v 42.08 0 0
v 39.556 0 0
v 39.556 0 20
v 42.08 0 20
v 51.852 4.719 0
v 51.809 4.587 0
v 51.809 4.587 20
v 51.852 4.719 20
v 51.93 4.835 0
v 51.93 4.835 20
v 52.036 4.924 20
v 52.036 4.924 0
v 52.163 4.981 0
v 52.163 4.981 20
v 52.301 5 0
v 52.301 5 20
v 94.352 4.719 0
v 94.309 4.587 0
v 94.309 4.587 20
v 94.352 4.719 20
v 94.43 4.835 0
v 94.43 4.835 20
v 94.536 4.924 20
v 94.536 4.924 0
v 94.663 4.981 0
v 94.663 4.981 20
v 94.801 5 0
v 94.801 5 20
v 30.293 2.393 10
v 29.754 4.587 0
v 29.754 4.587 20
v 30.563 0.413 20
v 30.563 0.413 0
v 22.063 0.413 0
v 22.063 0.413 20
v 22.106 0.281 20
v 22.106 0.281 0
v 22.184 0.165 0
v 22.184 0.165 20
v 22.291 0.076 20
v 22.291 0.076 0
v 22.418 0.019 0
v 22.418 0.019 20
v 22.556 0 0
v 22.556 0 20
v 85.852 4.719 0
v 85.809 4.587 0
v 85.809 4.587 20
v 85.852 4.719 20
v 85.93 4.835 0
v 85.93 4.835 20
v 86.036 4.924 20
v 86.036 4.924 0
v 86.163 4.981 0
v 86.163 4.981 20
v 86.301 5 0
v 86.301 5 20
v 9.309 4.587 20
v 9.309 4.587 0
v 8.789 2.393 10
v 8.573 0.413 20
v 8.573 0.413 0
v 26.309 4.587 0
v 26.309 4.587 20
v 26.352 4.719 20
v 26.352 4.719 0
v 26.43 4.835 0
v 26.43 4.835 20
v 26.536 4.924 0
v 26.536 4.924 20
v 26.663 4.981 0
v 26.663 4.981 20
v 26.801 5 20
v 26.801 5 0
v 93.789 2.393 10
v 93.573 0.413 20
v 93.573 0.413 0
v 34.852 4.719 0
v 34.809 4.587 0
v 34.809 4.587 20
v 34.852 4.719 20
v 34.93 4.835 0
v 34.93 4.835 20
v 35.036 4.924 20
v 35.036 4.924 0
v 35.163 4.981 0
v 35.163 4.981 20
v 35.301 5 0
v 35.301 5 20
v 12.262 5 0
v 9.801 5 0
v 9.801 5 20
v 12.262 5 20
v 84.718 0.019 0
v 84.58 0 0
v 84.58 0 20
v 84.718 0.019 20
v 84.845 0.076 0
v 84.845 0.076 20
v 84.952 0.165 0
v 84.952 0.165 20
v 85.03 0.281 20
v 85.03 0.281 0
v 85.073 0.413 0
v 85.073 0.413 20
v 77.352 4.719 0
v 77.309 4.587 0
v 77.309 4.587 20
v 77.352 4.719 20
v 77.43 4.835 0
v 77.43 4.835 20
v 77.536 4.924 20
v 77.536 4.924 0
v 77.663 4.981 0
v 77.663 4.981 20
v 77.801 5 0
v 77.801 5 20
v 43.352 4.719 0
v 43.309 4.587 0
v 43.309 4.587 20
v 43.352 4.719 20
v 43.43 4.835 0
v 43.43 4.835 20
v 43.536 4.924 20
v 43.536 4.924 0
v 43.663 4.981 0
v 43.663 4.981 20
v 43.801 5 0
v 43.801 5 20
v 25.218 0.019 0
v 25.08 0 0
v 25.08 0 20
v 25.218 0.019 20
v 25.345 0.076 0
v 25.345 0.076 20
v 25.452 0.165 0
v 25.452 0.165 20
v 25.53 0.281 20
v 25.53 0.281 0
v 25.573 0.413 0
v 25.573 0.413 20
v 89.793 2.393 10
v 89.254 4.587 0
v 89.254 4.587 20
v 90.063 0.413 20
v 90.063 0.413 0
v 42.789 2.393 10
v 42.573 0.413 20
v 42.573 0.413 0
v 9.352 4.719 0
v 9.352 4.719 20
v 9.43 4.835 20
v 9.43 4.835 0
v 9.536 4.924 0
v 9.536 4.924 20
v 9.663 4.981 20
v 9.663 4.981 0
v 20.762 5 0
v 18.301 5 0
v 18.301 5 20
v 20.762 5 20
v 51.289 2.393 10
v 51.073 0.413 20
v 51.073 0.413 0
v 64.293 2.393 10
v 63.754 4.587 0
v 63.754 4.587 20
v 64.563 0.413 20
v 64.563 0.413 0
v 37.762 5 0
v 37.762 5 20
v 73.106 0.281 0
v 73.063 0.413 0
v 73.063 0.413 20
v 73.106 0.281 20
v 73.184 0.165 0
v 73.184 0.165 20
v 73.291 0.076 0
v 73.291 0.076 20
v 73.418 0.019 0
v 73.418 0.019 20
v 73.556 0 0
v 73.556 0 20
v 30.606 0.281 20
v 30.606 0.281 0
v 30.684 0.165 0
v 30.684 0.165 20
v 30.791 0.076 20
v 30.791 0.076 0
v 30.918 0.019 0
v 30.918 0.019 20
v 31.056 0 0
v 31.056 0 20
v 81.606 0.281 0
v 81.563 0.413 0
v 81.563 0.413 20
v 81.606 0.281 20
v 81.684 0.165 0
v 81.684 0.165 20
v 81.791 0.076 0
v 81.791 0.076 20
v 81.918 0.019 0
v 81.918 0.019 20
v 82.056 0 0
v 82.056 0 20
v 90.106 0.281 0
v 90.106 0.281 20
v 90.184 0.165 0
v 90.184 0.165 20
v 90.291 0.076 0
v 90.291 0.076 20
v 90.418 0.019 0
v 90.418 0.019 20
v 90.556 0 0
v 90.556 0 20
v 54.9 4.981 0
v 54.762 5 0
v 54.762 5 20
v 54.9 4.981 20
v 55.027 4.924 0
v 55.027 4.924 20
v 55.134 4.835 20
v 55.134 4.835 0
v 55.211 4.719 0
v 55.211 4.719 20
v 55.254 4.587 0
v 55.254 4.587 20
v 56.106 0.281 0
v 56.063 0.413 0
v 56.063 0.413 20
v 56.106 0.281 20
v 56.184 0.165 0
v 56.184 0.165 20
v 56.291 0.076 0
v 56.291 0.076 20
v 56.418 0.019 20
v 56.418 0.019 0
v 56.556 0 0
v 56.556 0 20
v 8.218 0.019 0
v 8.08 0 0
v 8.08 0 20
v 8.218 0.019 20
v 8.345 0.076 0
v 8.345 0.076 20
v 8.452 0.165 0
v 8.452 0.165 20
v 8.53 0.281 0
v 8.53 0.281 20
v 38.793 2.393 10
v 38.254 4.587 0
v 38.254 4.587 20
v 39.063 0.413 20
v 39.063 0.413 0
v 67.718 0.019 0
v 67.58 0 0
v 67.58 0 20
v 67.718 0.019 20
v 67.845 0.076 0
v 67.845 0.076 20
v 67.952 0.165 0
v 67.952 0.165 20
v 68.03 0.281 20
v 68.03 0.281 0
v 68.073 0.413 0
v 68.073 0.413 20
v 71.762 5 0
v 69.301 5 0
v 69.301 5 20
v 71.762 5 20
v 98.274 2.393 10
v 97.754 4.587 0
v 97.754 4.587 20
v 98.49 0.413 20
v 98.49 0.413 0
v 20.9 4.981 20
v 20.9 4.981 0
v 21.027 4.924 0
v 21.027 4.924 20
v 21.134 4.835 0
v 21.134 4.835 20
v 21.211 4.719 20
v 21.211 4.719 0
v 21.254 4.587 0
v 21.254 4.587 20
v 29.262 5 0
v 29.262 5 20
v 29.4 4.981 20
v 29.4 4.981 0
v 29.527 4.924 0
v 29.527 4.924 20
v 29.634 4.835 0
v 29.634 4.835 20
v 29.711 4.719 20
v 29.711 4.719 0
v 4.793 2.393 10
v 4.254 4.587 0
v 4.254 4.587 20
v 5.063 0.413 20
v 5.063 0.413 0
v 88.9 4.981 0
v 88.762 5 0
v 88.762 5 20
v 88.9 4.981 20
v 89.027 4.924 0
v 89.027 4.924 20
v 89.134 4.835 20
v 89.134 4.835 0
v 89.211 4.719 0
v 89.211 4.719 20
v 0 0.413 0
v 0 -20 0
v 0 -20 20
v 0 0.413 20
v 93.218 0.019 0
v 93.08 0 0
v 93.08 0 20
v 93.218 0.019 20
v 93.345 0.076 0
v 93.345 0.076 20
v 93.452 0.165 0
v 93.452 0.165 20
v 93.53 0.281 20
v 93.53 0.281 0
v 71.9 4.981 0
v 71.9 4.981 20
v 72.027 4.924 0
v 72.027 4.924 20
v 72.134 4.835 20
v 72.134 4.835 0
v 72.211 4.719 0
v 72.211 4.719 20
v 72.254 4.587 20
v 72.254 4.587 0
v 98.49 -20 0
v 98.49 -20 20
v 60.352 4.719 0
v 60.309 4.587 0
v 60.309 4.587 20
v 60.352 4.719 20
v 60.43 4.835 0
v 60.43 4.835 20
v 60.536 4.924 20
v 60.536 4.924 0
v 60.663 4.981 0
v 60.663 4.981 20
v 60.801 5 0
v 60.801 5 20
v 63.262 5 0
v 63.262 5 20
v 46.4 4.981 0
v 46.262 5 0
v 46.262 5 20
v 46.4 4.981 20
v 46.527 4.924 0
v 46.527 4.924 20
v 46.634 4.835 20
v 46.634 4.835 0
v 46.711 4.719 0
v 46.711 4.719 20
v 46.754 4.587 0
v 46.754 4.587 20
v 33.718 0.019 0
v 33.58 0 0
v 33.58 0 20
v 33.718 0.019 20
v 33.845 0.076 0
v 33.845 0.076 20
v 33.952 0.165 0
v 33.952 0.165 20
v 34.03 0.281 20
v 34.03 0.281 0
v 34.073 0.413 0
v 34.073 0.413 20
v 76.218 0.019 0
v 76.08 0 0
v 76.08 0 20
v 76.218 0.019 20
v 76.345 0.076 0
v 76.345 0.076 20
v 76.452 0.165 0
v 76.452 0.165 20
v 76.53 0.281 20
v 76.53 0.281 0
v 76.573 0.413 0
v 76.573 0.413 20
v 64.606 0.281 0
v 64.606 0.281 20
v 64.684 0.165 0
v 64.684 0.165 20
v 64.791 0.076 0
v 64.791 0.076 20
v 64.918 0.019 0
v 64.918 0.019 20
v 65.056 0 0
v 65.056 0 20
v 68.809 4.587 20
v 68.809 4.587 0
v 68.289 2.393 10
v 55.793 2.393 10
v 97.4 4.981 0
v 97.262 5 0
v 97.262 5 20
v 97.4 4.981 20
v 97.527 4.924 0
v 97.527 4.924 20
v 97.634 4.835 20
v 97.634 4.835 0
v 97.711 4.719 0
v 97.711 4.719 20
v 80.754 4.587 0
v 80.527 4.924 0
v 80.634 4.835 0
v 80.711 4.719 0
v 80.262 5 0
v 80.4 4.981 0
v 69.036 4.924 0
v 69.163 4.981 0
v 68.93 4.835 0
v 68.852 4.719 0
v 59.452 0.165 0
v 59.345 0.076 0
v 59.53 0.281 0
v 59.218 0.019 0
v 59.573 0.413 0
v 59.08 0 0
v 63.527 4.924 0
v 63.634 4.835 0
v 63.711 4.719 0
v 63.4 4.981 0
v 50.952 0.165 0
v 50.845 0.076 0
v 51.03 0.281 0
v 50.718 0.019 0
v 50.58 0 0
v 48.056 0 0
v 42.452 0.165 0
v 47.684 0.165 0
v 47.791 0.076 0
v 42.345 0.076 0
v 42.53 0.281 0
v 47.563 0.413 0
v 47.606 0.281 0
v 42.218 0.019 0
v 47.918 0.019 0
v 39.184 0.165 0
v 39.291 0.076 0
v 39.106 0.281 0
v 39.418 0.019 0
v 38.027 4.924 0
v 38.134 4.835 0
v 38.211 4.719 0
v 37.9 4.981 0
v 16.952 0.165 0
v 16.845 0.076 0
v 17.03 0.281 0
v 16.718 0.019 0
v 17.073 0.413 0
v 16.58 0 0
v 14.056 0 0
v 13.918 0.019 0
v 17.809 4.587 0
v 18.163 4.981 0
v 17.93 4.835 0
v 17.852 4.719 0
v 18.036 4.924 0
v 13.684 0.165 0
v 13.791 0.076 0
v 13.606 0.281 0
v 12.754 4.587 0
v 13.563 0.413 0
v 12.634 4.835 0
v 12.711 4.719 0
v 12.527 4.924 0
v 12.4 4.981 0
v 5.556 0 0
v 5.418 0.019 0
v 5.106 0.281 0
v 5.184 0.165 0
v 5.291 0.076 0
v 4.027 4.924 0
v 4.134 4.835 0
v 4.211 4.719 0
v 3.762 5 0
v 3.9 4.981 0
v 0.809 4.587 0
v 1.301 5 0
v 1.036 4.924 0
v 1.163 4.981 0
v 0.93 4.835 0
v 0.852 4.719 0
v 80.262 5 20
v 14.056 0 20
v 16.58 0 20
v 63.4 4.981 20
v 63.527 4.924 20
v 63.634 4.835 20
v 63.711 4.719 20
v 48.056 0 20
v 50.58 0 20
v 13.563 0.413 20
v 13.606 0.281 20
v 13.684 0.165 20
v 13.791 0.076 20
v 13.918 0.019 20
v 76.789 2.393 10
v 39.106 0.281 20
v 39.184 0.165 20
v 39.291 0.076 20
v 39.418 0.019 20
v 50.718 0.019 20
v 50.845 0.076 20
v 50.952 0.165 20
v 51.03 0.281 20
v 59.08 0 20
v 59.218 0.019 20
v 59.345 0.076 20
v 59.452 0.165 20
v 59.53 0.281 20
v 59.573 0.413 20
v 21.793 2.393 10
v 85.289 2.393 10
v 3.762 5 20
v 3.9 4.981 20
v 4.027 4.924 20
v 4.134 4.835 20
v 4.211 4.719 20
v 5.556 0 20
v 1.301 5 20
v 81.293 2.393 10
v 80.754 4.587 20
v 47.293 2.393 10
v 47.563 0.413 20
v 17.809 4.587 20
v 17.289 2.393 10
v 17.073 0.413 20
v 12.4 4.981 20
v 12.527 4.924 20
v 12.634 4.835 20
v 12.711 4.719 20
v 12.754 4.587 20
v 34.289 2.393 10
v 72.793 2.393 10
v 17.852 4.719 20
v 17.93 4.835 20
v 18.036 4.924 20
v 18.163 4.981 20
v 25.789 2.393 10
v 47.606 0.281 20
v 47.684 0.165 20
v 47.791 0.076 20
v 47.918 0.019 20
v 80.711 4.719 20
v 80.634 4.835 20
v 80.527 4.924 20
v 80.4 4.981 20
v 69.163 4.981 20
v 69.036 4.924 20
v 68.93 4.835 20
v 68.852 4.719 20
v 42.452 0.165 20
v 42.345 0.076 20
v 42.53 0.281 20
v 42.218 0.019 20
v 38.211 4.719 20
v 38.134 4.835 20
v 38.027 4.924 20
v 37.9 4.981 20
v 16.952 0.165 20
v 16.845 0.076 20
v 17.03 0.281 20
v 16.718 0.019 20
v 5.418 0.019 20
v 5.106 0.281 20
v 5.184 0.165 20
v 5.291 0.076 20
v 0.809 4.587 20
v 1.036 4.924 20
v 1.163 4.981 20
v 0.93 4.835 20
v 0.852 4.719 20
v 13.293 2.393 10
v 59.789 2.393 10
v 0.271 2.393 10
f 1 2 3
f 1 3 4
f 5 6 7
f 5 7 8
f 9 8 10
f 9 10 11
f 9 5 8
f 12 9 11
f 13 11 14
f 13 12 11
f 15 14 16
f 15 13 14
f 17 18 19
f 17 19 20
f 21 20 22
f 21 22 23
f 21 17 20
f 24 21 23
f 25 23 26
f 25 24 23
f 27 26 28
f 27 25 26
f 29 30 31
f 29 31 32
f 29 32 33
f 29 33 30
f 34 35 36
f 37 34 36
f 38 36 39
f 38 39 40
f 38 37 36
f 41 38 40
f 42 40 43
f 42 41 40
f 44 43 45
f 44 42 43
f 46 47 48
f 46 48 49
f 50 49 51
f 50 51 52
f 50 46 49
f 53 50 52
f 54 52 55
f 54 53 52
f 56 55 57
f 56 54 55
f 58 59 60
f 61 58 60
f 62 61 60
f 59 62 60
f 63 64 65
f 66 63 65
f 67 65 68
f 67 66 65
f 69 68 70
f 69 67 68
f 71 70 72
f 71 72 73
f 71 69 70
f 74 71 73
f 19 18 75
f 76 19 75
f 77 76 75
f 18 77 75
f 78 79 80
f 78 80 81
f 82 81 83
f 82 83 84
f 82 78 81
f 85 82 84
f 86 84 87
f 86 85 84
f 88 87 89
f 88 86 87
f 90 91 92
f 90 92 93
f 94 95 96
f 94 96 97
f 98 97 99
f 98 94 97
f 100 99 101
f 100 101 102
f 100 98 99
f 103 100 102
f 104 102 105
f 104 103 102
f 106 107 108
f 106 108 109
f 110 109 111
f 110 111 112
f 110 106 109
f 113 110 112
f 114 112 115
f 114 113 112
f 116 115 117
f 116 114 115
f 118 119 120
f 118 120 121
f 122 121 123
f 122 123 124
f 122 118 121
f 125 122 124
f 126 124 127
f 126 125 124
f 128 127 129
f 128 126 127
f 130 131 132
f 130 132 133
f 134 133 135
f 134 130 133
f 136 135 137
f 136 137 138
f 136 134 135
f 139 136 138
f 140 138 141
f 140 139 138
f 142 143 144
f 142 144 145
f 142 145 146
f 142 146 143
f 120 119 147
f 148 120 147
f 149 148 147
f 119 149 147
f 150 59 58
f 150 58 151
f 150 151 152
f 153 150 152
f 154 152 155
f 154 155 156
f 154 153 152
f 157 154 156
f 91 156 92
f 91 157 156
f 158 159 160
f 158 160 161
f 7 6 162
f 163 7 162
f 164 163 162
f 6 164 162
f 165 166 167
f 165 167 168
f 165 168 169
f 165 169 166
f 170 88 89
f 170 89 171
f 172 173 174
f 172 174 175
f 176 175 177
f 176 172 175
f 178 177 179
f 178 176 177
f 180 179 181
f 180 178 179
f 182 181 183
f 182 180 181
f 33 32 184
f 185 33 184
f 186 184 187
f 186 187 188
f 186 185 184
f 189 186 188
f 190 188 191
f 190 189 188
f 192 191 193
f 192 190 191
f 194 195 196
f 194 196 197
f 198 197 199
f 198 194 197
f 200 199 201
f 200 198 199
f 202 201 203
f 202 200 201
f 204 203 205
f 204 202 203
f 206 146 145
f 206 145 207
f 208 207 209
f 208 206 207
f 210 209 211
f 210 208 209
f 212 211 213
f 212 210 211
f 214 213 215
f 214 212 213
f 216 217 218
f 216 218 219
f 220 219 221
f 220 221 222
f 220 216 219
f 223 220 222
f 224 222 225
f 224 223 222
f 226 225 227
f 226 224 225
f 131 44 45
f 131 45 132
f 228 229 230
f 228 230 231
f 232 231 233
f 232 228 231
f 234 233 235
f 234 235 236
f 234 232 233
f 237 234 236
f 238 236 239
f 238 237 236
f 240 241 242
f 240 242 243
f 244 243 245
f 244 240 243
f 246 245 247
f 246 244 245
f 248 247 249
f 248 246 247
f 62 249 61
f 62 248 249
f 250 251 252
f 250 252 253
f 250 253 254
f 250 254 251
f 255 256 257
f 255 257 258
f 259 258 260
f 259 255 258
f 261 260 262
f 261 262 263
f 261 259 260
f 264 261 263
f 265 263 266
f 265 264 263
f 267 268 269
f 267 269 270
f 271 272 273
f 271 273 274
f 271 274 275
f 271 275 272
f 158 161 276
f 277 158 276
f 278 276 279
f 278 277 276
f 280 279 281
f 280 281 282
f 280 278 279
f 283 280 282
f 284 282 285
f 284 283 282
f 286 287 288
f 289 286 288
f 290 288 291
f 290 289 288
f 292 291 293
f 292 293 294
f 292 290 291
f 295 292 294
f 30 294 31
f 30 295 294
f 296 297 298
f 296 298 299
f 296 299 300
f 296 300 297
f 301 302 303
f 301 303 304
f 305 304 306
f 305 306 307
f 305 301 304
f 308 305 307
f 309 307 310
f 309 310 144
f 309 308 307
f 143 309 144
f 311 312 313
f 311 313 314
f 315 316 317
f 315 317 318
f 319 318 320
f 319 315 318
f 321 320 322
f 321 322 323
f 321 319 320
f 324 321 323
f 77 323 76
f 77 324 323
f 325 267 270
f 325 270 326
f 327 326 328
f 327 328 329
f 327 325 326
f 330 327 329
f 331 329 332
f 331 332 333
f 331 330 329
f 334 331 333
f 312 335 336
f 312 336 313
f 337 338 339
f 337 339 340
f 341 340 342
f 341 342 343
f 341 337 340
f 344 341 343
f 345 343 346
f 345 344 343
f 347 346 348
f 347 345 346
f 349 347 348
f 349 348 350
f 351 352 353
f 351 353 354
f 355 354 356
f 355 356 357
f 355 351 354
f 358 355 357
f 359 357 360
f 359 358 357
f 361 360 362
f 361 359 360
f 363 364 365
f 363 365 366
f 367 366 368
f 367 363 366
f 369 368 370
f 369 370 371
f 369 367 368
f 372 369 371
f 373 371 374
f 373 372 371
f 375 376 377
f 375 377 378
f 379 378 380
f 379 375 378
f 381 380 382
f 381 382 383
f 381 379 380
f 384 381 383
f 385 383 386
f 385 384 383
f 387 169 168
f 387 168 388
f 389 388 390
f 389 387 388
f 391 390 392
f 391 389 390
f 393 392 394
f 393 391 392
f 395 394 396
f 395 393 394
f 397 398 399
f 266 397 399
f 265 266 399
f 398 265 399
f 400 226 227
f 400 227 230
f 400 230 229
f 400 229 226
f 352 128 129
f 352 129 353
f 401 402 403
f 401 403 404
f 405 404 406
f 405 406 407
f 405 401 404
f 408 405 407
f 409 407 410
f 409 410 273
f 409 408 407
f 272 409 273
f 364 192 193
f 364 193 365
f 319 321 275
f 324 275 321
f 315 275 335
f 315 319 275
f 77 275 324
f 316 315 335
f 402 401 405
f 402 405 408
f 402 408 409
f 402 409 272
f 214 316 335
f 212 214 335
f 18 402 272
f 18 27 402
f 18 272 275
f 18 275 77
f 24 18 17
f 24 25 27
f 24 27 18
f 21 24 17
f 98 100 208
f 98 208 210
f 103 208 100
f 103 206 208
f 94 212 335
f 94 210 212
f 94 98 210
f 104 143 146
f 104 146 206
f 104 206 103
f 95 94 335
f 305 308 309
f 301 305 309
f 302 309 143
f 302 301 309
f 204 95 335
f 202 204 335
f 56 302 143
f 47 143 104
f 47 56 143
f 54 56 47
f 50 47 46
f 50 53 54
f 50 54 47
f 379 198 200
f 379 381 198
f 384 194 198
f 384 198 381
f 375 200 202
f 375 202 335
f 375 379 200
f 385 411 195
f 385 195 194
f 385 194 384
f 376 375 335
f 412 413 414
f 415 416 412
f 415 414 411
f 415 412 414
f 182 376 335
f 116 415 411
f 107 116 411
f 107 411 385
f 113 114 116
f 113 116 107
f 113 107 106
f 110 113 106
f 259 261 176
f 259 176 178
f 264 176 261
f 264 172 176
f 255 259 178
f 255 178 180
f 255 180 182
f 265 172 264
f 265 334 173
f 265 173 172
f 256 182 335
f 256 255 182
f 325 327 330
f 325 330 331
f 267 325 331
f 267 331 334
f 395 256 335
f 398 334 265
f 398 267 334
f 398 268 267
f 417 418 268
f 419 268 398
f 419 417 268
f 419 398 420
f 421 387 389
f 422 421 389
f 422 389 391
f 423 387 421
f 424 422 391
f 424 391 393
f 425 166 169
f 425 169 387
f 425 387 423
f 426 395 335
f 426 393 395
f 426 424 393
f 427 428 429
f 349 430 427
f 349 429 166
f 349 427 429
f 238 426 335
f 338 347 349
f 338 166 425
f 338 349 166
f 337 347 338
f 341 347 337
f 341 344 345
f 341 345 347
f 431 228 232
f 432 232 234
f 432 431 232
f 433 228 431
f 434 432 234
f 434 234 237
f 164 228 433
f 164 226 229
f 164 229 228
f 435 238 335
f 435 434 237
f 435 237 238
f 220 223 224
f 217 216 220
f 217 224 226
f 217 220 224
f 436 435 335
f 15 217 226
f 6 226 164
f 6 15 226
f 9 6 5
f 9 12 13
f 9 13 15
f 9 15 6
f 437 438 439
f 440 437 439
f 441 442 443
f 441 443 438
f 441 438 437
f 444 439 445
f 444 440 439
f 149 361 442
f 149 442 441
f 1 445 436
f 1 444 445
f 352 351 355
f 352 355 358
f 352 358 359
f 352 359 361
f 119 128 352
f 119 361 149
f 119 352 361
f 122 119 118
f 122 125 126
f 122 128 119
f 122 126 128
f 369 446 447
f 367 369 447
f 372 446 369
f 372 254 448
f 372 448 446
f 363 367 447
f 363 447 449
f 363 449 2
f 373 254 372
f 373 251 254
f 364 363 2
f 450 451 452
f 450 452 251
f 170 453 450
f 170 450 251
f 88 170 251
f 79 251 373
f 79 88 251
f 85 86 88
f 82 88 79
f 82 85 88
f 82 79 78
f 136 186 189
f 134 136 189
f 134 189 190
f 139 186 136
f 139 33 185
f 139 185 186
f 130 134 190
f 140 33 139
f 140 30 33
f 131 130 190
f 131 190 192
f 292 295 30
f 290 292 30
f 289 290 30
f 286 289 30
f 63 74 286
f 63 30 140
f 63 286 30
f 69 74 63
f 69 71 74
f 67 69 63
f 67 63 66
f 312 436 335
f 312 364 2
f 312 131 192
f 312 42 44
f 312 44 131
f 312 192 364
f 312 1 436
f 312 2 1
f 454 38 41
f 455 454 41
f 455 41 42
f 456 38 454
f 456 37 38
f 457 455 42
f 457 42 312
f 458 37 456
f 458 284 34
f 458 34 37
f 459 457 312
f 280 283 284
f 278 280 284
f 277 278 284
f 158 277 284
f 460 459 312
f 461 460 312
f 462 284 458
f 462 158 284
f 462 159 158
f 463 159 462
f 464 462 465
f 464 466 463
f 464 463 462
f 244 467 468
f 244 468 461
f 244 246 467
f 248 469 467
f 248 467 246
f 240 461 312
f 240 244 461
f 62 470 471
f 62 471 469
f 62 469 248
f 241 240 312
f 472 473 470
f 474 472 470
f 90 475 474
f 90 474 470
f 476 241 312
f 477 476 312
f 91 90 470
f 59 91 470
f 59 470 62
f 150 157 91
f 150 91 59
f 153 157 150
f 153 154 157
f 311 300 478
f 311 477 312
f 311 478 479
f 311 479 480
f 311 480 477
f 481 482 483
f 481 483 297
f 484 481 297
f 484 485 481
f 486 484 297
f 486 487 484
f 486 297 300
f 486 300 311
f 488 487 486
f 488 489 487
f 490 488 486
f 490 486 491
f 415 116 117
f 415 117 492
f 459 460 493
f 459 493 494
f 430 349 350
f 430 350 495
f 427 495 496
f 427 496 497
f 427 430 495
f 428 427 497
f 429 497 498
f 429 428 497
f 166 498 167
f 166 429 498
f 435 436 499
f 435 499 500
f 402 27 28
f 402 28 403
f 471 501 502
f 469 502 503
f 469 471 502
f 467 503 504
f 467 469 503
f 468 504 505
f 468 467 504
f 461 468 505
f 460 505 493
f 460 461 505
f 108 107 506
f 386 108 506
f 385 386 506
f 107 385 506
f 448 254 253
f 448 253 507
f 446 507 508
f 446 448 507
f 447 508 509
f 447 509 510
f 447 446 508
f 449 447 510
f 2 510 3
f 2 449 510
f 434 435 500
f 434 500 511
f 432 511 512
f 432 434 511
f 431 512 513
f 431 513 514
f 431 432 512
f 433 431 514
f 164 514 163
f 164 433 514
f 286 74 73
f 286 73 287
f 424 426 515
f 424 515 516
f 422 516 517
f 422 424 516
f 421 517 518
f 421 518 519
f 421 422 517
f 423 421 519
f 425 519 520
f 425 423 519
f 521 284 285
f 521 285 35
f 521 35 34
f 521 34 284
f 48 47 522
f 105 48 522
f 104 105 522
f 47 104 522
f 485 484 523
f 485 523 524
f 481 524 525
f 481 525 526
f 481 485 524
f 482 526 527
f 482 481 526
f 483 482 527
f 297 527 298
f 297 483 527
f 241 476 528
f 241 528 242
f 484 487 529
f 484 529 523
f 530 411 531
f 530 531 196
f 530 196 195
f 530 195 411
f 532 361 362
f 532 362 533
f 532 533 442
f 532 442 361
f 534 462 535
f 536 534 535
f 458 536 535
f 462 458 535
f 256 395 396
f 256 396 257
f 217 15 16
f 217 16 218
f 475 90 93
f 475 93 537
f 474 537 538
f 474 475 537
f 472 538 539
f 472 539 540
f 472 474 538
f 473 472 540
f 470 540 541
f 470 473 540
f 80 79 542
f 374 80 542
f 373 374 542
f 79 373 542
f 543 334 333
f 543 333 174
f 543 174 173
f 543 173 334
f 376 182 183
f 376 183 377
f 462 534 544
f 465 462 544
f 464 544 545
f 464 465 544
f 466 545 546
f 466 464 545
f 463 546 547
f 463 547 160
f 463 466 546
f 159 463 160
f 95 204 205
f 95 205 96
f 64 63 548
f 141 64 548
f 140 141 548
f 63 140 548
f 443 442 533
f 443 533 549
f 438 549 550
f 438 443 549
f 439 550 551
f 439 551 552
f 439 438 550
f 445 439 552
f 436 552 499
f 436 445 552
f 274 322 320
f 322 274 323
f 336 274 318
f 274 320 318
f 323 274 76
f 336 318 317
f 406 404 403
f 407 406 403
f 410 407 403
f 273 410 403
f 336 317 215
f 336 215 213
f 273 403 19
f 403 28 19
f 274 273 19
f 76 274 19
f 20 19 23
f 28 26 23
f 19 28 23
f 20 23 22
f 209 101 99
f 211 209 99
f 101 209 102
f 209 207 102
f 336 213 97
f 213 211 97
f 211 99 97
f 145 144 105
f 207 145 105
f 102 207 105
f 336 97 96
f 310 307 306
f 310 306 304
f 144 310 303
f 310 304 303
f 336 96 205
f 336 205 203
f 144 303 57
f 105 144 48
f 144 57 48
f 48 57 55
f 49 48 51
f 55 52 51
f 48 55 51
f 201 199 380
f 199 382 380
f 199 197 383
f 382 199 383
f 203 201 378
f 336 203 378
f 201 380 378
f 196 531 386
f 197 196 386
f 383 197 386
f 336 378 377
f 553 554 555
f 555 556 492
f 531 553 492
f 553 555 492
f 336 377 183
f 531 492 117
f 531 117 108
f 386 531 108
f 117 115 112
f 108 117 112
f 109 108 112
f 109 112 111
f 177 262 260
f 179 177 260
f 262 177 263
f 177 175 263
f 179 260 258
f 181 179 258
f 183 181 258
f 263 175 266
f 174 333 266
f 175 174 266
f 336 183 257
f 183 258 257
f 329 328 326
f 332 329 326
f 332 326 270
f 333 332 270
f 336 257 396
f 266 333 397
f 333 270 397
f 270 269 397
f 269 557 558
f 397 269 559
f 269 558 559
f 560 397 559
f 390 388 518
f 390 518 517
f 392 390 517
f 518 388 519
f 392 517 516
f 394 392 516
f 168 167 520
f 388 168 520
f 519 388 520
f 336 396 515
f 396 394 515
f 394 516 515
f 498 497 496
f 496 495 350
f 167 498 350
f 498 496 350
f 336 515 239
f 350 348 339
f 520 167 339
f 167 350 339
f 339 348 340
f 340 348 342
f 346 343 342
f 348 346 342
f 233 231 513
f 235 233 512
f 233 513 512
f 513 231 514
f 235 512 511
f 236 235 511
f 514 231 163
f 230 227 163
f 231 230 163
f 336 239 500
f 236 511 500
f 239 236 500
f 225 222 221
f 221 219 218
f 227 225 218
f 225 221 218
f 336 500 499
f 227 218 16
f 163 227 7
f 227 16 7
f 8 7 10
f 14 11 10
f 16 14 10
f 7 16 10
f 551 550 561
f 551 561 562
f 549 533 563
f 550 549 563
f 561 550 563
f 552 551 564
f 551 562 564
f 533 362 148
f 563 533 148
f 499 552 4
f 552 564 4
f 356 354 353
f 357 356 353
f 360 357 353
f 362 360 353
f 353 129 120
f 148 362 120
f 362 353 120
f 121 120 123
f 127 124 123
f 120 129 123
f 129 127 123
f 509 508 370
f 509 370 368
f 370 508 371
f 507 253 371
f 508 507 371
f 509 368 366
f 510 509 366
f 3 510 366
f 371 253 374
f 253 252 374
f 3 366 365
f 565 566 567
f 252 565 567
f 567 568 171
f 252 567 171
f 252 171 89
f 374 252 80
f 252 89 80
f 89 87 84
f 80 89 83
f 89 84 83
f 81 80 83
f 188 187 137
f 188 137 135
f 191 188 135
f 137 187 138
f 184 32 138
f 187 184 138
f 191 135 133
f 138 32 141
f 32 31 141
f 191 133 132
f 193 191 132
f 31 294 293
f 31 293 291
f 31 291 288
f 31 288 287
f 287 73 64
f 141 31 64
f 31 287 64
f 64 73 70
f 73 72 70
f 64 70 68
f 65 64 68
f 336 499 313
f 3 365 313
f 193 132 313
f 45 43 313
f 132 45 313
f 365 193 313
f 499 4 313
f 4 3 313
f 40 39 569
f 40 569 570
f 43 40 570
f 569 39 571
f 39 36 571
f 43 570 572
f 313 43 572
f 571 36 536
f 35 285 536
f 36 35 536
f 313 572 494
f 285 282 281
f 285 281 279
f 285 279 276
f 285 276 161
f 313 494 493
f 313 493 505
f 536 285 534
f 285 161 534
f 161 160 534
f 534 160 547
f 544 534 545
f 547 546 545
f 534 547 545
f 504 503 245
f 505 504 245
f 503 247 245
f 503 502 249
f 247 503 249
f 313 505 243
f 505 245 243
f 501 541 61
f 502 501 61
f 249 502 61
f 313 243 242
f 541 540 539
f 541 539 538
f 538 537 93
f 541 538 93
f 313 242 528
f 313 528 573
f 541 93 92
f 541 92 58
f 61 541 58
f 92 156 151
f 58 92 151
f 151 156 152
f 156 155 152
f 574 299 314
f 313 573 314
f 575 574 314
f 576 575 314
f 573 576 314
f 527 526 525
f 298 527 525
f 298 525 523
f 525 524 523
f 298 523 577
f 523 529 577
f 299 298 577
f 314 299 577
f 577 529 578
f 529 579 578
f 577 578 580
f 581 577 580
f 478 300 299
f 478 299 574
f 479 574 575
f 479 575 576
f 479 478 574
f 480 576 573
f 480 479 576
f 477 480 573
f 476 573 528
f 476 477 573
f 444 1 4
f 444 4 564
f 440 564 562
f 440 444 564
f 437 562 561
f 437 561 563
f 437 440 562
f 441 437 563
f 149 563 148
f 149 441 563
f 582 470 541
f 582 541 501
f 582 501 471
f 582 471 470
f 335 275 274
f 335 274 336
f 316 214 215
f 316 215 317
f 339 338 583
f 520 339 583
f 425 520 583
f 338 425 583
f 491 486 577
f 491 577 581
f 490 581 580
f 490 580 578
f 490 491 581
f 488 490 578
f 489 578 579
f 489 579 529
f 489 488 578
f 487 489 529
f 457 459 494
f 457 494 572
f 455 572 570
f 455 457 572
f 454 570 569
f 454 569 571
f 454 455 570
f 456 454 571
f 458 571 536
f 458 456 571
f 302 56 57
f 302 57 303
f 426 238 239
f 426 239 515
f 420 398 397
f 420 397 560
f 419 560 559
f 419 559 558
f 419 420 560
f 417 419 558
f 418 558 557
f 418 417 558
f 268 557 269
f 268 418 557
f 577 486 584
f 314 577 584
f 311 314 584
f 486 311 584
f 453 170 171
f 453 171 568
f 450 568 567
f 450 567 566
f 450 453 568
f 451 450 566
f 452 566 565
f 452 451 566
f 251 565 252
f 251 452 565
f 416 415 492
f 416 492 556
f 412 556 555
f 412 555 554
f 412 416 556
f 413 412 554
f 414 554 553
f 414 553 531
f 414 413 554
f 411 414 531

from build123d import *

# Parameters (mm, degrees)
BOSS_EXTRUDE1_DEPTH = 20


with BuildPart() as part:
    # Sketch2 → Boss-Extrude1 (new body)
    with BuildSketch(Plane.XY):
        with BuildLine():
            Line((5.555673684, 0), (8.080450184, 0))
            ThreePointArc((8.080450184, 0), (8.401843989, 0.116977778), (8.572854061, 0.413175911))
            add(Edge.make_bspline(
                [(9.308780843, 4.586824089), (8.63696399, 2.286518146), (8.572854061, 0.413175911)],
                knots=[0, 0, 0, 1, 1, 1], degree=2))
            ThreePointArc((9.308780843, 4.586824089), (9.479790914, 4.883022222), (9.801184719, 5))
            Line((9.801184719, 5), (12.262085088, 5))
            ThreePointArc((12.262085088, 5), (12.583478893, 4.883022222), (12.754488964, 4.586824089))
            add(Edge.make_bspline(
                [(12.754488964, 4.586824089), (13.426305818, 2.286518146), (13.563269807, 0.413175911)],
                knots=[0, 0, 0, 1, 1, 1], degree=2))
            ThreePointArc((13.563269807, 0.413175911), (13.734279879, 0.116977778), (14.055673684, 0))
            Line((14.055673684, 0), (16.580450184, 0))
            ThreePointArc((16.580450184, 0), (16.901843989, 0.116977778), (17.072854061, 0.413175911))
            add(Edge.make_bspline(
                [(17.808780843, 4.586824089), (17.13696399, 2.286518146), (17.072854061, 0.413175911)],
                knots=[0, 0, 0, 1, 1, 1], degree=2))
            ThreePointArc((17.808780843, 4.586824089), (17.979790914, 4.883022222), (18.301184719, 5))
            Line((18.301184719, 5), (20.762085088, 5))
            ThreePointArc((20.762085088, 5), (21.083478893, 4.883022222), (21.254488964, 4.586824089))
            add(Edge.make_bspline(
                [(21.254488964, 4.586824089), (21.926305818, 2.286518146), (22.063269807, 0.413175911)],
                knots=[0, 0, 0, 1, 1, 1], degree=2))
            ThreePointArc((22.063269807, 0.413175911), (22.234279879, 0.116977778), (22.555673684, 0))
            Line((22.555673684, 0), (25.080450184, 0))
            ThreePointArc((25.080450184, 0), (25.401843989, 0.116977778), (25.572854061, 0.413175911))
            add(Edge.make_bspline(
                [(26.308780843, 4.586824089), (25.63696399, 2.286518146), (25.572854061, 0.413175911)],
                knots=[0, 0, 0, 1, 1, 1], degree=2))
            ThreePointArc((26.308780843, 4.586824089), (26.479790914, 4.883022222), (26.801184719, 5))
            Line((26.801184719, 5), (29.262085088, 5))
            ThreePointArc((29.262085088, 5), (29.583478893, 4.883022222), (29.754488964, 4.586824089))
            add(Edge.make_bspline(
                [(29.754488964, 4.586824089), (30.426305818, 2.286518146), (30.563269807, 0.413175911)],
                knots=[0, 0, 0, 1, 1, 1], degree=2))
            ThreePointArc((30.563269807, 0.413175911), (30.734279879, 0.116977778), (31.055673684, 0))
            Line((31.055673684, 0), (33.580450184, 0))
            ThreePointArc((33.580450184, 0), (33.901843989, 0.116977778), (34.072854061, 0.413175911))
            add(Edge.make_bspline(
                [(34.808780843, 4.586824089), (34.13696399, 2.286518146), (34.072854061, 0.413175911)],
                knots=[0, 0, 0, 1, 1, 1], degree=2))
            ThreePointArc((34.808780843, 4.586824089), (34.979790914, 4.883022222), (35.301184719, 5))
            Line((35.301184719, 5), (37.762085088, 5))
            ThreePointArc((37.762085088, 5), (38.083478893, 4.883022222), (38.254488964, 4.586824089))
            add(Edge.make_bspline(
                [(38.254488964, 4.586824089), (38.926305818, 2.286518146), (39.063269807, 0.413175911)],
                knots=[0, 0, 0, 1, 1, 1], degree=2))
            ThreePointArc((39.063269807, 0.413175911), (39.234279879, 0.116977778), (39.555673684, 0))
            Line((39.555673684, 0), (42.080450184, 0))
            ThreePointArc((42.080450184, 0), (42.401843989, 0.116977778), (42.572854061, 0.413175911))
            add(Edge.make_bspline(
                [(43.308780843, 4.586824089), (42.63696399, 2.286518146), (42.572854061, 0.413175911)],
                knots=[0, 0, 0, 1, 1, 1], degree=2))
            ThreePointArc((43.308780843, 4.586824089), (43.479790914, 4.883022222), (43.801184719, 5))
            Line((43.801184719, 5), (46.262085088, 5))
            ThreePointArc((46.262085088, 5), (46.583478893, 4.883022222), (46.754488964, 4.586824089))
            add(Edge.make_bspline(
                [(46.754488964, 4.586824089), (47.426305818, 2.286518146), (47.563269807, 0.413175911)],
                knots=[0, 0, 0, 1, 1, 1], degree=2))
            ThreePointArc((47.563269807, 0.413175911), (47.734279879, 0.116977778), (48.055673684, 0))
            Line((48.055673684, 0), (50.580450184, 0))
            ThreePointArc((50.580450184, 0), (50.901843989, 0.116977778), (51.072854061, 0.413175911))
            add(Edge.make_bspline(
                [(51.808780843, 4.586824089), (51.13696399, 2.286518146), (51.072854061, 0.413175911)],
                knots=[0, 0, 0, 1, 1, 1], degree=2))
            ThreePointArc((51.808780843, 4.586824089), (51.979790914, 4.883022222), (52.301184719, 5))
            Line((52.301184719, 5), (54.762085088, 5))
            ThreePointArc((54.762085088, 5), (55.083478893, 4.883022222), (55.254488964, 4.586824089))
            add(Edge.make_bspline(
                [(55.254488964, 4.586824089), (55.926305818, 2.286518146), (56.063269807, 0.413175911)],
                knots=[0, 0, 0, 1, 1, 1], degree=2))
            ThreePointArc((56.063269807, 0.413175911), (56.234279879, 0.116977778), (56.555673684, 0))
            Line((56.555673684, 0), (59.080450184, 0))
            ThreePointArc((59.080450184, 0), (59.401843989, 0.116977778), (59.572854061, 0.413175911))
            add(Edge.make_bspline(
                [(60.308780843, 4.586824089), (59.63696399, 2.286518146), (59.572854061, 0.413175911)],
                knots=[0, 0, 0, 1, 1, 1], degree=2))
            ThreePointArc((60.308780843, 4.586824089), (60.479790914, 4.883022222), (60.801184719, 5))
            Line((60.801184719, 5), (63.262085088, 5))
            ThreePointArc((63.262085088, 5), (63.583478893, 4.883022222), (63.754488964, 4.586824089))
            add(Edge.make_bspline(
                [(63.754488964, 4.586824089), (64.426305818, 2.286518146), (64.563269807, 0.413175911)],
                knots=[0, 0, 0, 1, 1, 1], degree=2))
            ThreePointArc((64.563269807, 0.413175911), (64.734279879, 0.116977778), (65.055673684, 0))
            Line((65.055673684, 0), (67.580450184, 0))
            ThreePointArc((67.580450184, 0), (67.901843989, 0.116977778), (68.072854061, 0.413175911))
            add(Edge.make_bspline(
                [(68.808780843, 4.586824089), (68.13696399, 2.286518146), (68.072854061, 0.413175911)],
                knots=[0, 0, 0, 1, 1, 1], degree=2))
            ThreePointArc((68.808780843, 4.586824089), (68.979790914, 4.883022222), (69.301184719, 5))
            Line((69.301184719, 5), (71.762085088, 5))
            ThreePointArc((71.762085088, 5), (72.083478893, 4.883022222), (72.254488964, 4.586824089))
            add(Edge.make_bspline(
                [(72.254488964, 4.586824089), (72.926305818, 2.286518146), (73.063269807, 0.413175911)],
                knots=[0, 0, 0, 1, 1, 1], degree=2))
            ThreePointArc((73.063269807, 0.413175911), (73.234279879, 0.116977778), (73.555673684, 0))
            Line((73.555673684, 0), (76.080450184, 0))
            ThreePointArc((76.080450184, 0), (76.401843989, 0.116977778), (76.572854061, 0.413175911))
            add(Edge.make_bspline(
                [(77.308780843, 4.586824089), (76.63696399, 2.286518146), (76.572854061, 0.413175911)],
                knots=[0, 0, 0, 1, 1, 1], degree=2))
            ThreePointArc((77.308780843, 4.586824089), (77.479790914, 4.883022222), (77.801184719, 5))
            Line((77.801184719, 5), (80.262085088, 5))
            ThreePointArc((80.262085088, 5), (80.583478893, 4.883022222), (80.754488964, 4.586824089))
            add(Edge.make_bspline(
                [(80.754488964, 4.586824089), (81.426305818, 2.286518146), (81.563269807, 0.413175911)],
                knots=[0, 0, 0, 1, 1, 1], degree=2))
            ThreePointArc((81.563269807, 0.413175911), (81.734279879, 0.116977778), (82.055673684, 0))
            Line((82.055673684, 0), (84.580450184, 0))
            ThreePointArc((84.580450184, 0), (84.901843989, 0.116977778), (85.072854061, 0.413175911))
            add(Edge.make_bspline(
                [(85.808780843, 4.586824089), (85.13696399, 2.286518146), (85.072854061, 0.413175911)],
                knots=[0, 0, 0, 1, 1, 1], degree=2))
            ThreePointArc((85.808780843, 4.586824089), (85.979790914, 4.883022222), (86.301184719, 5))
            Line((86.301184719, 5), (88.762085088, 5))
            ThreePointArc((88.762085088, 5), (89.083478893, 4.883022222), (89.254488964, 4.586824089))
            add(Edge.make_bspline(
                [(89.254488964, 4.586824089), (89.926305818, 2.286518146), (90.063269807, 0.413175911)],
                knots=[0, 0, 0, 1, 1, 1], degree=2))
            ThreePointArc((90.063269807, 0.413175911), (90.234279879, 0.116977778), (90.555673684, 0))
            Line((90.555673684, 0), (93.080450184, 0))
            ThreePointArc((93.080450184, 0), (93.401843989, 0.116977778), (93.572854061, 0.413175911))
            add(Edge.make_bspline(
                [(94.308780843, 4.586824089), (93.63696399, 2.286518146), (93.572854061, 0.413175911)],
                knots=[0, 0, 0, 1, 1, 1], degree=2))
            ThreePointArc((94.308780843, 4.586824089), (94.479790914, 4.883022222), (94.801184719, 5))
            Line((94.801184719, 5), (97.262085088, 5))
            ThreePointArc((97.262085088, 5), (97.583478893, 4.883022222), (97.754488964, 4.586824089))
            add(Edge.make_bspline(
                [(97.754488964, 4.586824089), (98.426305818, 2.286518146), (98.490415746, 0.413175911)],
                knots=[0, 0, 0, 1, 1, 1], degree=2))
            Line((98.490415746, 0.413175911), (98.490415746, -20))
            Line((98.490415746, -20), (0, -20))
            Line((0, -20), (0, 0))
            Line((0, 0), (0, 0.413175911))
            add(Edge.make_bspline(
                [(0.808780843, 4.586824089), (0.13696399, 2.286518146), (0, 0.413175911)],
                knots=[0, 0, 0, 1, 1, 1], degree=2))
            ThreePointArc((0.808780843, 4.586824089), (0.979790914, 4.883022222), (1.301184719, 5))
            Line((1.301184719, 5), (3.762085088, 5))
            ThreePointArc((3.762085088, 5), (4.083478893, 4.883022222), (4.254488964, 4.586824089))
            add(Edge.make_bspline(
                [(4.254488964, 4.586824089), (4.926305818, 2.286518146), (5.063269807, 0.413175911)],
                knots=[0, 0, 0, 1, 1, 1], degree=2))
            ThreePointArc((5.063269807, 0.413175911), (5.234279879, 0.116977778), (5.555673684, 0))
        make_face()
    extrude(amount=BOSS_EXTRUDE1_DEPTH)


solid = part.part
